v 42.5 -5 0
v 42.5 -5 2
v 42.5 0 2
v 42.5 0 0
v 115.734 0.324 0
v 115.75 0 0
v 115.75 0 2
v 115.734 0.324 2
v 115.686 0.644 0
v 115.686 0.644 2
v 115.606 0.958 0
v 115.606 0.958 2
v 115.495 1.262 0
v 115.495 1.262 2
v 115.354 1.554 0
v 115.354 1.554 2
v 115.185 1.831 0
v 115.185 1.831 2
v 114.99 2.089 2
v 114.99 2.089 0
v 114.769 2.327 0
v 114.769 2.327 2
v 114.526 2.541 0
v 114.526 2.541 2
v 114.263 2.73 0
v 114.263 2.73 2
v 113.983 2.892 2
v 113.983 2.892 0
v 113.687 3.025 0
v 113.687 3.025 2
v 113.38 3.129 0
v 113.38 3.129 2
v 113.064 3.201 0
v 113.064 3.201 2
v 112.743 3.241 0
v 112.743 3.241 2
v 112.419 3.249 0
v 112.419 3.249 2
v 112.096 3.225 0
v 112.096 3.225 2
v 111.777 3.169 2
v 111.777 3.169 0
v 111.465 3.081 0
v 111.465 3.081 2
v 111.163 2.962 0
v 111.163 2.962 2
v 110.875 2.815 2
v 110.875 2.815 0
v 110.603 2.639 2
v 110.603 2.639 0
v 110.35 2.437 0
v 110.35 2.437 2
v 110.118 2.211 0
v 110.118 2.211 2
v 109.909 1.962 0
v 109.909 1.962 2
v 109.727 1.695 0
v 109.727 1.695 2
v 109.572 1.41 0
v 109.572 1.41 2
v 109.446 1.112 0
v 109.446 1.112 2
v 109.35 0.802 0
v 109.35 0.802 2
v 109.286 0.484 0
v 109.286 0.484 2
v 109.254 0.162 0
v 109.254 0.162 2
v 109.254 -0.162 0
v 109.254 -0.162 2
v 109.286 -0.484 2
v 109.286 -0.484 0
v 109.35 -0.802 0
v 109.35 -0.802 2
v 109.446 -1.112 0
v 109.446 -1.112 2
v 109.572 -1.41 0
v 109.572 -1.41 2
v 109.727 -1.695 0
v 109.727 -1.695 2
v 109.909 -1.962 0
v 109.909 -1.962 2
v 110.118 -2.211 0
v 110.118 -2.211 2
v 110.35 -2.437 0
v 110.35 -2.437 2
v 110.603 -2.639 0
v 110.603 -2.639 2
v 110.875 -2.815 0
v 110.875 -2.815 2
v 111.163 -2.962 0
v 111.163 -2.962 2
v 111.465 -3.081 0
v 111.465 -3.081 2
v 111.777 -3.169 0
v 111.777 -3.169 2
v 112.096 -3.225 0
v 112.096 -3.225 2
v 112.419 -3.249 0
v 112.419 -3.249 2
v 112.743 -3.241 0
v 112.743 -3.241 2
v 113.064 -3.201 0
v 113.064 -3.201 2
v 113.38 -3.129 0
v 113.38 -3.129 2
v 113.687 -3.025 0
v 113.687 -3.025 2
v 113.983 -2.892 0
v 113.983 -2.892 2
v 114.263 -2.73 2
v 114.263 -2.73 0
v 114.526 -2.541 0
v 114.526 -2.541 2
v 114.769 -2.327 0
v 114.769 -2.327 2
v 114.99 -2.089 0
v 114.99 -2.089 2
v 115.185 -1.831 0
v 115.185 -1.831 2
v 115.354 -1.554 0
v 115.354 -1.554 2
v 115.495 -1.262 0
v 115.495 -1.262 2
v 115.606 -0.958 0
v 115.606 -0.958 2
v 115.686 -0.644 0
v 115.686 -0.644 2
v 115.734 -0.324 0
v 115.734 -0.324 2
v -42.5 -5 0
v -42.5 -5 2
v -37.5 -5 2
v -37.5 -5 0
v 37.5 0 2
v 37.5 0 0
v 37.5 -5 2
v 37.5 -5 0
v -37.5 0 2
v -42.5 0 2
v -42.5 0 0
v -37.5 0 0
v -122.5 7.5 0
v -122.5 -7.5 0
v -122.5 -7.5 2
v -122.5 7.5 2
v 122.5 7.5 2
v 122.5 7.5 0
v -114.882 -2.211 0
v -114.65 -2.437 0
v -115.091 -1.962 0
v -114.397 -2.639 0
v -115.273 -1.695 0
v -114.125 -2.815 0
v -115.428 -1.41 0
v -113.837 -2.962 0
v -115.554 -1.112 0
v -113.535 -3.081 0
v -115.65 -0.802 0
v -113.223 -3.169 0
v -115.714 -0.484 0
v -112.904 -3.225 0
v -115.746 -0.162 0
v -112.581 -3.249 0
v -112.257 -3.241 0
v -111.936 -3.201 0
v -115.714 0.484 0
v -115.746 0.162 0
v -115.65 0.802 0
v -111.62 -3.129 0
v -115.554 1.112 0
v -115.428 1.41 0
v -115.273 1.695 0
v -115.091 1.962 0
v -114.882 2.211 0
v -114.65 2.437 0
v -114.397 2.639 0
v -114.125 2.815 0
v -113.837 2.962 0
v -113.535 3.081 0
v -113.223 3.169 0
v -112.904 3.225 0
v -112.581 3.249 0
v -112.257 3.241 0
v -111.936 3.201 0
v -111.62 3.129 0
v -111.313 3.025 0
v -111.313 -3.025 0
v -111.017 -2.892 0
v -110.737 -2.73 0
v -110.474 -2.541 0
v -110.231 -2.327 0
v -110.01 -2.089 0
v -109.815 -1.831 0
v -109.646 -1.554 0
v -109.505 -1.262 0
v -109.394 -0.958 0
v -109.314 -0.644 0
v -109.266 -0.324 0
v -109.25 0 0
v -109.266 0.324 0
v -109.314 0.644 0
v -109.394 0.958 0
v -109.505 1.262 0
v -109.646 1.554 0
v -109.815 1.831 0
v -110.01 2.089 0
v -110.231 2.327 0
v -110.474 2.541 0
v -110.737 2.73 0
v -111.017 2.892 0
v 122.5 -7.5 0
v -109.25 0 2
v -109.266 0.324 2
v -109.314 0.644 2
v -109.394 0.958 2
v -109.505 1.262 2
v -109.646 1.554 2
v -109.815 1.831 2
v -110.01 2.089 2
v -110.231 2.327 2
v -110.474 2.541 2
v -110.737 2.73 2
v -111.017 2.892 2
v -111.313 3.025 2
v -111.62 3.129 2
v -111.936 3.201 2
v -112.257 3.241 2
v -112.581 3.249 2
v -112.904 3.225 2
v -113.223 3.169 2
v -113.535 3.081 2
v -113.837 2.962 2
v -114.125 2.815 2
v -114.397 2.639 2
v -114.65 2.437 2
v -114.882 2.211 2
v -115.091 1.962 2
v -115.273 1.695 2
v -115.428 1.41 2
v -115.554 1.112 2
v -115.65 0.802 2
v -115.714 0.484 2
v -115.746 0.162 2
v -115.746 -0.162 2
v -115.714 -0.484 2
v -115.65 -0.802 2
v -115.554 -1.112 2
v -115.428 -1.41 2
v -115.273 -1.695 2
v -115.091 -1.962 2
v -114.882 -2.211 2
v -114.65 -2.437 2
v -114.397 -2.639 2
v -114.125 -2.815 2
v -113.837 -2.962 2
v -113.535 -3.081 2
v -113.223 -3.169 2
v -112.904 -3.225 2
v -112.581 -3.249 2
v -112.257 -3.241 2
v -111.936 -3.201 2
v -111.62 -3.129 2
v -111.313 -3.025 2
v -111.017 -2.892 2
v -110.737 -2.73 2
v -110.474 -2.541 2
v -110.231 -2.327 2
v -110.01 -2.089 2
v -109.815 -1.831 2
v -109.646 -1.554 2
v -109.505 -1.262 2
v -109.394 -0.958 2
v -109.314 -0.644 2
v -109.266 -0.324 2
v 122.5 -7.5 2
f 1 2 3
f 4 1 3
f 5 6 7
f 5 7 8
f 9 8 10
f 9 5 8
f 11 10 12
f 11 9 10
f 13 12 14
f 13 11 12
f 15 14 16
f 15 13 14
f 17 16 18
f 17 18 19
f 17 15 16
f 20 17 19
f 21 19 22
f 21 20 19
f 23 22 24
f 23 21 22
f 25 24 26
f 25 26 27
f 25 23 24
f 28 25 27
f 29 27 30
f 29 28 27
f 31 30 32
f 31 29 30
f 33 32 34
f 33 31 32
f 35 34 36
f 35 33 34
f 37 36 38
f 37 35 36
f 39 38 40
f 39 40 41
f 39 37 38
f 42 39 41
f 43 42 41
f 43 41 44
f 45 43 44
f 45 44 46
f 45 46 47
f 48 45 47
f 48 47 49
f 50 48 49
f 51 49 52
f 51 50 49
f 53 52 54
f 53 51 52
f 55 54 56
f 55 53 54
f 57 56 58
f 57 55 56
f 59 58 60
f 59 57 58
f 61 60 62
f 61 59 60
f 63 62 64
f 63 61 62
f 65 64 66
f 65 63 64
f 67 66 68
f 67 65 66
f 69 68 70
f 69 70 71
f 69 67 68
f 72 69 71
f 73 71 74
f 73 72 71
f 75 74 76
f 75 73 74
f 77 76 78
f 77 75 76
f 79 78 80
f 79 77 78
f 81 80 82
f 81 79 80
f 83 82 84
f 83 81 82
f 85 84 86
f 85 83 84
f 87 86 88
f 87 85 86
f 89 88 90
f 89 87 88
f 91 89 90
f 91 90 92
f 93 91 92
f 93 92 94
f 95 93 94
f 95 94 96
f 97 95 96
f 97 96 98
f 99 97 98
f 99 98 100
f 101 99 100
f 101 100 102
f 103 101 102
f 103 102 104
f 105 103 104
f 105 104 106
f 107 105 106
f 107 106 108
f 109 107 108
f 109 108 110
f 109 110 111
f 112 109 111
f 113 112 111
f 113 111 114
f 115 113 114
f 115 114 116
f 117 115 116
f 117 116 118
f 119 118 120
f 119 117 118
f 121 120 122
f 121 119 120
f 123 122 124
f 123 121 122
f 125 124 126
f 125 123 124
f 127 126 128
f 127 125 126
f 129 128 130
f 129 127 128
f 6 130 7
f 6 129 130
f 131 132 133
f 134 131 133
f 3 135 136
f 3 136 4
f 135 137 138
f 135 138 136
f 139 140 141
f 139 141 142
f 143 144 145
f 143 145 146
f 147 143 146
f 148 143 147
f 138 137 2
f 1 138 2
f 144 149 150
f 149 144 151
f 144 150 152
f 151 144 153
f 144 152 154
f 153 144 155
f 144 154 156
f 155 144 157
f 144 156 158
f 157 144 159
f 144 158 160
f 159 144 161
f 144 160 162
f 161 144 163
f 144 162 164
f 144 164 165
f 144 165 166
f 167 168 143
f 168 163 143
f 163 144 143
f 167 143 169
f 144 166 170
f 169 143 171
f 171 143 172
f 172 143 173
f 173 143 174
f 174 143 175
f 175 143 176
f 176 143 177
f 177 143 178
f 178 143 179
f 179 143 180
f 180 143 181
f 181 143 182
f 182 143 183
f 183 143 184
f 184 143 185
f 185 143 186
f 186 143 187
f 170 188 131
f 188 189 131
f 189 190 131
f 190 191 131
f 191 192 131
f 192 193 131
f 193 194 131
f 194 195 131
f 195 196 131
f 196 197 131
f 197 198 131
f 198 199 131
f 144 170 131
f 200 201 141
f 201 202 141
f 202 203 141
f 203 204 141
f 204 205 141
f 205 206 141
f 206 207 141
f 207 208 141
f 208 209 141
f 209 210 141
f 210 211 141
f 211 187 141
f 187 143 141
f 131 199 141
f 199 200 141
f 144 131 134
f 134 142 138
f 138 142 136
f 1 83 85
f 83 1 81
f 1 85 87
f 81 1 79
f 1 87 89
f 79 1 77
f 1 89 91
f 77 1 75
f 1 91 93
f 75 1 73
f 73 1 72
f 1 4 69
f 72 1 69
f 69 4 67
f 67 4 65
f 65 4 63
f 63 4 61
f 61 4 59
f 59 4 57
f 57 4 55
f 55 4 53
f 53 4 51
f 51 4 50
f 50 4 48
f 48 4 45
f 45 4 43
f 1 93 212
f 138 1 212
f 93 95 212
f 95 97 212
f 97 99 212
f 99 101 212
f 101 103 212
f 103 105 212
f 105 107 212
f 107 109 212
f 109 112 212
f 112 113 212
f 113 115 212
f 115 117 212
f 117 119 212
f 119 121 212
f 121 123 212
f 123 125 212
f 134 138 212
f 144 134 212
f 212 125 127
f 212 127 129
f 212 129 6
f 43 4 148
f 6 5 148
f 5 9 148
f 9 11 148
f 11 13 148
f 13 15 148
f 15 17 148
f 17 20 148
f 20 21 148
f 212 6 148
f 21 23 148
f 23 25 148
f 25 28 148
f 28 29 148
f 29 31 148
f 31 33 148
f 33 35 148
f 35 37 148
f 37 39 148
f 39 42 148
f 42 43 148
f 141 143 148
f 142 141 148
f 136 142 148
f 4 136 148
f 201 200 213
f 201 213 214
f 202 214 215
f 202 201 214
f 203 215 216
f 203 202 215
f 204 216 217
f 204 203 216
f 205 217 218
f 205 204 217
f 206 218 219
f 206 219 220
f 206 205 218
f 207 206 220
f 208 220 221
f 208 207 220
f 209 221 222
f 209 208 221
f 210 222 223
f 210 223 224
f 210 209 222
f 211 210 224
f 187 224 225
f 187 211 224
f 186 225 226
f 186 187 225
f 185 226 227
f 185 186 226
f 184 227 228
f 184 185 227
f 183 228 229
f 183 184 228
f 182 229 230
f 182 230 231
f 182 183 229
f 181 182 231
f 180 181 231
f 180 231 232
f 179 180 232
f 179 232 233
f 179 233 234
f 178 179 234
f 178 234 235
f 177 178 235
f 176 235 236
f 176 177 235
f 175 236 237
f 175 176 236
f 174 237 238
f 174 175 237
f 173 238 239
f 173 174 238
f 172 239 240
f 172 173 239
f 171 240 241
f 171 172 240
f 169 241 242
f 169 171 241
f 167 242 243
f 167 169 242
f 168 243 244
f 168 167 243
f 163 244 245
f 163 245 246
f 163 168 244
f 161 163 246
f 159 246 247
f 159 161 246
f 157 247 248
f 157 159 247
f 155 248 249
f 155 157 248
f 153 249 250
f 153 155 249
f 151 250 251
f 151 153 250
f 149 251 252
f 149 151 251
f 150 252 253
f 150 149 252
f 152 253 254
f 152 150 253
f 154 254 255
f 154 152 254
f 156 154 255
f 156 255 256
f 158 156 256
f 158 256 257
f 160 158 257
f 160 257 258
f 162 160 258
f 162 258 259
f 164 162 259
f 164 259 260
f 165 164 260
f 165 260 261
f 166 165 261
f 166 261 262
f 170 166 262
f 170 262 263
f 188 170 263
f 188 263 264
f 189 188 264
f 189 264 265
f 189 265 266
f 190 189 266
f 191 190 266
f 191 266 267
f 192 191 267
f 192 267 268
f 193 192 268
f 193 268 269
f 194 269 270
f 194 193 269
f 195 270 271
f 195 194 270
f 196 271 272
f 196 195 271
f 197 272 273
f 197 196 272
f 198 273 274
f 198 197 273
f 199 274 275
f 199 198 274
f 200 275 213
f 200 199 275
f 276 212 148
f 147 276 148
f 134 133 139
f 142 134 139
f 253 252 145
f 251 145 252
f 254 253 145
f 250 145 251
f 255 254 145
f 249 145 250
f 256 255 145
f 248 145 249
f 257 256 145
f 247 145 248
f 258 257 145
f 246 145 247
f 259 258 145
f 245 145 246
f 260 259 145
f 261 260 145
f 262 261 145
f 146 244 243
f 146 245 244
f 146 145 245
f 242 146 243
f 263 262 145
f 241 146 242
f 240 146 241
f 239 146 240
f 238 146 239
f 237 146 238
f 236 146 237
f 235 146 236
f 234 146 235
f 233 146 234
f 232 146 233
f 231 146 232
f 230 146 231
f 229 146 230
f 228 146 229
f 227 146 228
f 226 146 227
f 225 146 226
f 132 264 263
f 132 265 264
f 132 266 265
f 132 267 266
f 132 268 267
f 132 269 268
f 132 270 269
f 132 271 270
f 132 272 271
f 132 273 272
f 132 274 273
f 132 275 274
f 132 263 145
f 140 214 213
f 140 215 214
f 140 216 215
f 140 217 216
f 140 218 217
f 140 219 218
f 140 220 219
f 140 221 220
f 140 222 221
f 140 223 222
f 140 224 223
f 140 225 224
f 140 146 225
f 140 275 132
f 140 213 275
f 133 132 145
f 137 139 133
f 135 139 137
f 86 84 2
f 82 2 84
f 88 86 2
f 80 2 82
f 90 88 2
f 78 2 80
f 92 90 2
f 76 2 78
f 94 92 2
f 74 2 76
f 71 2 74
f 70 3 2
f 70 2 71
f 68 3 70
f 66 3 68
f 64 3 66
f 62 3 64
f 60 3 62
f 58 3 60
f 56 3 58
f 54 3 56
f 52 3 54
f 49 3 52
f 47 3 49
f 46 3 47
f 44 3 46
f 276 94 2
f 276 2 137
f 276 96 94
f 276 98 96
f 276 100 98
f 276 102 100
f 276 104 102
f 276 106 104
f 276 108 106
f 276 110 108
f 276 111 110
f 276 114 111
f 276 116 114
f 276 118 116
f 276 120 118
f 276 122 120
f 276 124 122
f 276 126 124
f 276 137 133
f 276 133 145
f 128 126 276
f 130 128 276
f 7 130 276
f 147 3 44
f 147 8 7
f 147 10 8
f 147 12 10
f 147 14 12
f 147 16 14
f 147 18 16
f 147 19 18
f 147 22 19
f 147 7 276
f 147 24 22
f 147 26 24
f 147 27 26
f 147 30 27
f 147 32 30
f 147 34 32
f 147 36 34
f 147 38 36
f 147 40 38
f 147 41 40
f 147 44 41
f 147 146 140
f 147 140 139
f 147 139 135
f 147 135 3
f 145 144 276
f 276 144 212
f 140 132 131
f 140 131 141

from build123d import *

# Parameters (mm, degrees)
SKETCH1_W           = 245
SKETCH1_H           = 15
SKETCH1_R           = 3.25
BOSS_EXTRUDE1_DEPTH = 2
SKETCH2_W           = 5
SKETCH2_H           = 5
CUT_EXTRUDE1_DEPTH  = 10


with BuildPart() as part:
    # Sketch1 → Boss-Extrude1 (new body)
    with BuildSketch(Plane.XY):
        Rectangle(SKETCH1_W, SKETCH1_H)
        with Locations((-112.5, 0)):
            Circle(SKETCH1_R, mode=Mode.SUBTRACT)
        with Locations((112.5, 0)):
            Circle(SKETCH1_R, mode=Mode.SUBTRACT)
    extrude(amount=BOSS_EXTRUDE1_DEPTH)

    # Sketch2 → Cut-Extrude1 (cut)
    with BuildSketch(Plane.XY.offset(2)):
        with Locations((-40, -2.5)):
            Rectangle(SKETCH2_W, SKETCH2_H)
        with Locations((40, -2.5)):
            Rectangle(SKETCH2_W, SKETCH2_H)
    extrude(amount=-CUT_EXTRUDE1_DEPTH, mode=Mode.SUBTRACT)


solid = part.part
